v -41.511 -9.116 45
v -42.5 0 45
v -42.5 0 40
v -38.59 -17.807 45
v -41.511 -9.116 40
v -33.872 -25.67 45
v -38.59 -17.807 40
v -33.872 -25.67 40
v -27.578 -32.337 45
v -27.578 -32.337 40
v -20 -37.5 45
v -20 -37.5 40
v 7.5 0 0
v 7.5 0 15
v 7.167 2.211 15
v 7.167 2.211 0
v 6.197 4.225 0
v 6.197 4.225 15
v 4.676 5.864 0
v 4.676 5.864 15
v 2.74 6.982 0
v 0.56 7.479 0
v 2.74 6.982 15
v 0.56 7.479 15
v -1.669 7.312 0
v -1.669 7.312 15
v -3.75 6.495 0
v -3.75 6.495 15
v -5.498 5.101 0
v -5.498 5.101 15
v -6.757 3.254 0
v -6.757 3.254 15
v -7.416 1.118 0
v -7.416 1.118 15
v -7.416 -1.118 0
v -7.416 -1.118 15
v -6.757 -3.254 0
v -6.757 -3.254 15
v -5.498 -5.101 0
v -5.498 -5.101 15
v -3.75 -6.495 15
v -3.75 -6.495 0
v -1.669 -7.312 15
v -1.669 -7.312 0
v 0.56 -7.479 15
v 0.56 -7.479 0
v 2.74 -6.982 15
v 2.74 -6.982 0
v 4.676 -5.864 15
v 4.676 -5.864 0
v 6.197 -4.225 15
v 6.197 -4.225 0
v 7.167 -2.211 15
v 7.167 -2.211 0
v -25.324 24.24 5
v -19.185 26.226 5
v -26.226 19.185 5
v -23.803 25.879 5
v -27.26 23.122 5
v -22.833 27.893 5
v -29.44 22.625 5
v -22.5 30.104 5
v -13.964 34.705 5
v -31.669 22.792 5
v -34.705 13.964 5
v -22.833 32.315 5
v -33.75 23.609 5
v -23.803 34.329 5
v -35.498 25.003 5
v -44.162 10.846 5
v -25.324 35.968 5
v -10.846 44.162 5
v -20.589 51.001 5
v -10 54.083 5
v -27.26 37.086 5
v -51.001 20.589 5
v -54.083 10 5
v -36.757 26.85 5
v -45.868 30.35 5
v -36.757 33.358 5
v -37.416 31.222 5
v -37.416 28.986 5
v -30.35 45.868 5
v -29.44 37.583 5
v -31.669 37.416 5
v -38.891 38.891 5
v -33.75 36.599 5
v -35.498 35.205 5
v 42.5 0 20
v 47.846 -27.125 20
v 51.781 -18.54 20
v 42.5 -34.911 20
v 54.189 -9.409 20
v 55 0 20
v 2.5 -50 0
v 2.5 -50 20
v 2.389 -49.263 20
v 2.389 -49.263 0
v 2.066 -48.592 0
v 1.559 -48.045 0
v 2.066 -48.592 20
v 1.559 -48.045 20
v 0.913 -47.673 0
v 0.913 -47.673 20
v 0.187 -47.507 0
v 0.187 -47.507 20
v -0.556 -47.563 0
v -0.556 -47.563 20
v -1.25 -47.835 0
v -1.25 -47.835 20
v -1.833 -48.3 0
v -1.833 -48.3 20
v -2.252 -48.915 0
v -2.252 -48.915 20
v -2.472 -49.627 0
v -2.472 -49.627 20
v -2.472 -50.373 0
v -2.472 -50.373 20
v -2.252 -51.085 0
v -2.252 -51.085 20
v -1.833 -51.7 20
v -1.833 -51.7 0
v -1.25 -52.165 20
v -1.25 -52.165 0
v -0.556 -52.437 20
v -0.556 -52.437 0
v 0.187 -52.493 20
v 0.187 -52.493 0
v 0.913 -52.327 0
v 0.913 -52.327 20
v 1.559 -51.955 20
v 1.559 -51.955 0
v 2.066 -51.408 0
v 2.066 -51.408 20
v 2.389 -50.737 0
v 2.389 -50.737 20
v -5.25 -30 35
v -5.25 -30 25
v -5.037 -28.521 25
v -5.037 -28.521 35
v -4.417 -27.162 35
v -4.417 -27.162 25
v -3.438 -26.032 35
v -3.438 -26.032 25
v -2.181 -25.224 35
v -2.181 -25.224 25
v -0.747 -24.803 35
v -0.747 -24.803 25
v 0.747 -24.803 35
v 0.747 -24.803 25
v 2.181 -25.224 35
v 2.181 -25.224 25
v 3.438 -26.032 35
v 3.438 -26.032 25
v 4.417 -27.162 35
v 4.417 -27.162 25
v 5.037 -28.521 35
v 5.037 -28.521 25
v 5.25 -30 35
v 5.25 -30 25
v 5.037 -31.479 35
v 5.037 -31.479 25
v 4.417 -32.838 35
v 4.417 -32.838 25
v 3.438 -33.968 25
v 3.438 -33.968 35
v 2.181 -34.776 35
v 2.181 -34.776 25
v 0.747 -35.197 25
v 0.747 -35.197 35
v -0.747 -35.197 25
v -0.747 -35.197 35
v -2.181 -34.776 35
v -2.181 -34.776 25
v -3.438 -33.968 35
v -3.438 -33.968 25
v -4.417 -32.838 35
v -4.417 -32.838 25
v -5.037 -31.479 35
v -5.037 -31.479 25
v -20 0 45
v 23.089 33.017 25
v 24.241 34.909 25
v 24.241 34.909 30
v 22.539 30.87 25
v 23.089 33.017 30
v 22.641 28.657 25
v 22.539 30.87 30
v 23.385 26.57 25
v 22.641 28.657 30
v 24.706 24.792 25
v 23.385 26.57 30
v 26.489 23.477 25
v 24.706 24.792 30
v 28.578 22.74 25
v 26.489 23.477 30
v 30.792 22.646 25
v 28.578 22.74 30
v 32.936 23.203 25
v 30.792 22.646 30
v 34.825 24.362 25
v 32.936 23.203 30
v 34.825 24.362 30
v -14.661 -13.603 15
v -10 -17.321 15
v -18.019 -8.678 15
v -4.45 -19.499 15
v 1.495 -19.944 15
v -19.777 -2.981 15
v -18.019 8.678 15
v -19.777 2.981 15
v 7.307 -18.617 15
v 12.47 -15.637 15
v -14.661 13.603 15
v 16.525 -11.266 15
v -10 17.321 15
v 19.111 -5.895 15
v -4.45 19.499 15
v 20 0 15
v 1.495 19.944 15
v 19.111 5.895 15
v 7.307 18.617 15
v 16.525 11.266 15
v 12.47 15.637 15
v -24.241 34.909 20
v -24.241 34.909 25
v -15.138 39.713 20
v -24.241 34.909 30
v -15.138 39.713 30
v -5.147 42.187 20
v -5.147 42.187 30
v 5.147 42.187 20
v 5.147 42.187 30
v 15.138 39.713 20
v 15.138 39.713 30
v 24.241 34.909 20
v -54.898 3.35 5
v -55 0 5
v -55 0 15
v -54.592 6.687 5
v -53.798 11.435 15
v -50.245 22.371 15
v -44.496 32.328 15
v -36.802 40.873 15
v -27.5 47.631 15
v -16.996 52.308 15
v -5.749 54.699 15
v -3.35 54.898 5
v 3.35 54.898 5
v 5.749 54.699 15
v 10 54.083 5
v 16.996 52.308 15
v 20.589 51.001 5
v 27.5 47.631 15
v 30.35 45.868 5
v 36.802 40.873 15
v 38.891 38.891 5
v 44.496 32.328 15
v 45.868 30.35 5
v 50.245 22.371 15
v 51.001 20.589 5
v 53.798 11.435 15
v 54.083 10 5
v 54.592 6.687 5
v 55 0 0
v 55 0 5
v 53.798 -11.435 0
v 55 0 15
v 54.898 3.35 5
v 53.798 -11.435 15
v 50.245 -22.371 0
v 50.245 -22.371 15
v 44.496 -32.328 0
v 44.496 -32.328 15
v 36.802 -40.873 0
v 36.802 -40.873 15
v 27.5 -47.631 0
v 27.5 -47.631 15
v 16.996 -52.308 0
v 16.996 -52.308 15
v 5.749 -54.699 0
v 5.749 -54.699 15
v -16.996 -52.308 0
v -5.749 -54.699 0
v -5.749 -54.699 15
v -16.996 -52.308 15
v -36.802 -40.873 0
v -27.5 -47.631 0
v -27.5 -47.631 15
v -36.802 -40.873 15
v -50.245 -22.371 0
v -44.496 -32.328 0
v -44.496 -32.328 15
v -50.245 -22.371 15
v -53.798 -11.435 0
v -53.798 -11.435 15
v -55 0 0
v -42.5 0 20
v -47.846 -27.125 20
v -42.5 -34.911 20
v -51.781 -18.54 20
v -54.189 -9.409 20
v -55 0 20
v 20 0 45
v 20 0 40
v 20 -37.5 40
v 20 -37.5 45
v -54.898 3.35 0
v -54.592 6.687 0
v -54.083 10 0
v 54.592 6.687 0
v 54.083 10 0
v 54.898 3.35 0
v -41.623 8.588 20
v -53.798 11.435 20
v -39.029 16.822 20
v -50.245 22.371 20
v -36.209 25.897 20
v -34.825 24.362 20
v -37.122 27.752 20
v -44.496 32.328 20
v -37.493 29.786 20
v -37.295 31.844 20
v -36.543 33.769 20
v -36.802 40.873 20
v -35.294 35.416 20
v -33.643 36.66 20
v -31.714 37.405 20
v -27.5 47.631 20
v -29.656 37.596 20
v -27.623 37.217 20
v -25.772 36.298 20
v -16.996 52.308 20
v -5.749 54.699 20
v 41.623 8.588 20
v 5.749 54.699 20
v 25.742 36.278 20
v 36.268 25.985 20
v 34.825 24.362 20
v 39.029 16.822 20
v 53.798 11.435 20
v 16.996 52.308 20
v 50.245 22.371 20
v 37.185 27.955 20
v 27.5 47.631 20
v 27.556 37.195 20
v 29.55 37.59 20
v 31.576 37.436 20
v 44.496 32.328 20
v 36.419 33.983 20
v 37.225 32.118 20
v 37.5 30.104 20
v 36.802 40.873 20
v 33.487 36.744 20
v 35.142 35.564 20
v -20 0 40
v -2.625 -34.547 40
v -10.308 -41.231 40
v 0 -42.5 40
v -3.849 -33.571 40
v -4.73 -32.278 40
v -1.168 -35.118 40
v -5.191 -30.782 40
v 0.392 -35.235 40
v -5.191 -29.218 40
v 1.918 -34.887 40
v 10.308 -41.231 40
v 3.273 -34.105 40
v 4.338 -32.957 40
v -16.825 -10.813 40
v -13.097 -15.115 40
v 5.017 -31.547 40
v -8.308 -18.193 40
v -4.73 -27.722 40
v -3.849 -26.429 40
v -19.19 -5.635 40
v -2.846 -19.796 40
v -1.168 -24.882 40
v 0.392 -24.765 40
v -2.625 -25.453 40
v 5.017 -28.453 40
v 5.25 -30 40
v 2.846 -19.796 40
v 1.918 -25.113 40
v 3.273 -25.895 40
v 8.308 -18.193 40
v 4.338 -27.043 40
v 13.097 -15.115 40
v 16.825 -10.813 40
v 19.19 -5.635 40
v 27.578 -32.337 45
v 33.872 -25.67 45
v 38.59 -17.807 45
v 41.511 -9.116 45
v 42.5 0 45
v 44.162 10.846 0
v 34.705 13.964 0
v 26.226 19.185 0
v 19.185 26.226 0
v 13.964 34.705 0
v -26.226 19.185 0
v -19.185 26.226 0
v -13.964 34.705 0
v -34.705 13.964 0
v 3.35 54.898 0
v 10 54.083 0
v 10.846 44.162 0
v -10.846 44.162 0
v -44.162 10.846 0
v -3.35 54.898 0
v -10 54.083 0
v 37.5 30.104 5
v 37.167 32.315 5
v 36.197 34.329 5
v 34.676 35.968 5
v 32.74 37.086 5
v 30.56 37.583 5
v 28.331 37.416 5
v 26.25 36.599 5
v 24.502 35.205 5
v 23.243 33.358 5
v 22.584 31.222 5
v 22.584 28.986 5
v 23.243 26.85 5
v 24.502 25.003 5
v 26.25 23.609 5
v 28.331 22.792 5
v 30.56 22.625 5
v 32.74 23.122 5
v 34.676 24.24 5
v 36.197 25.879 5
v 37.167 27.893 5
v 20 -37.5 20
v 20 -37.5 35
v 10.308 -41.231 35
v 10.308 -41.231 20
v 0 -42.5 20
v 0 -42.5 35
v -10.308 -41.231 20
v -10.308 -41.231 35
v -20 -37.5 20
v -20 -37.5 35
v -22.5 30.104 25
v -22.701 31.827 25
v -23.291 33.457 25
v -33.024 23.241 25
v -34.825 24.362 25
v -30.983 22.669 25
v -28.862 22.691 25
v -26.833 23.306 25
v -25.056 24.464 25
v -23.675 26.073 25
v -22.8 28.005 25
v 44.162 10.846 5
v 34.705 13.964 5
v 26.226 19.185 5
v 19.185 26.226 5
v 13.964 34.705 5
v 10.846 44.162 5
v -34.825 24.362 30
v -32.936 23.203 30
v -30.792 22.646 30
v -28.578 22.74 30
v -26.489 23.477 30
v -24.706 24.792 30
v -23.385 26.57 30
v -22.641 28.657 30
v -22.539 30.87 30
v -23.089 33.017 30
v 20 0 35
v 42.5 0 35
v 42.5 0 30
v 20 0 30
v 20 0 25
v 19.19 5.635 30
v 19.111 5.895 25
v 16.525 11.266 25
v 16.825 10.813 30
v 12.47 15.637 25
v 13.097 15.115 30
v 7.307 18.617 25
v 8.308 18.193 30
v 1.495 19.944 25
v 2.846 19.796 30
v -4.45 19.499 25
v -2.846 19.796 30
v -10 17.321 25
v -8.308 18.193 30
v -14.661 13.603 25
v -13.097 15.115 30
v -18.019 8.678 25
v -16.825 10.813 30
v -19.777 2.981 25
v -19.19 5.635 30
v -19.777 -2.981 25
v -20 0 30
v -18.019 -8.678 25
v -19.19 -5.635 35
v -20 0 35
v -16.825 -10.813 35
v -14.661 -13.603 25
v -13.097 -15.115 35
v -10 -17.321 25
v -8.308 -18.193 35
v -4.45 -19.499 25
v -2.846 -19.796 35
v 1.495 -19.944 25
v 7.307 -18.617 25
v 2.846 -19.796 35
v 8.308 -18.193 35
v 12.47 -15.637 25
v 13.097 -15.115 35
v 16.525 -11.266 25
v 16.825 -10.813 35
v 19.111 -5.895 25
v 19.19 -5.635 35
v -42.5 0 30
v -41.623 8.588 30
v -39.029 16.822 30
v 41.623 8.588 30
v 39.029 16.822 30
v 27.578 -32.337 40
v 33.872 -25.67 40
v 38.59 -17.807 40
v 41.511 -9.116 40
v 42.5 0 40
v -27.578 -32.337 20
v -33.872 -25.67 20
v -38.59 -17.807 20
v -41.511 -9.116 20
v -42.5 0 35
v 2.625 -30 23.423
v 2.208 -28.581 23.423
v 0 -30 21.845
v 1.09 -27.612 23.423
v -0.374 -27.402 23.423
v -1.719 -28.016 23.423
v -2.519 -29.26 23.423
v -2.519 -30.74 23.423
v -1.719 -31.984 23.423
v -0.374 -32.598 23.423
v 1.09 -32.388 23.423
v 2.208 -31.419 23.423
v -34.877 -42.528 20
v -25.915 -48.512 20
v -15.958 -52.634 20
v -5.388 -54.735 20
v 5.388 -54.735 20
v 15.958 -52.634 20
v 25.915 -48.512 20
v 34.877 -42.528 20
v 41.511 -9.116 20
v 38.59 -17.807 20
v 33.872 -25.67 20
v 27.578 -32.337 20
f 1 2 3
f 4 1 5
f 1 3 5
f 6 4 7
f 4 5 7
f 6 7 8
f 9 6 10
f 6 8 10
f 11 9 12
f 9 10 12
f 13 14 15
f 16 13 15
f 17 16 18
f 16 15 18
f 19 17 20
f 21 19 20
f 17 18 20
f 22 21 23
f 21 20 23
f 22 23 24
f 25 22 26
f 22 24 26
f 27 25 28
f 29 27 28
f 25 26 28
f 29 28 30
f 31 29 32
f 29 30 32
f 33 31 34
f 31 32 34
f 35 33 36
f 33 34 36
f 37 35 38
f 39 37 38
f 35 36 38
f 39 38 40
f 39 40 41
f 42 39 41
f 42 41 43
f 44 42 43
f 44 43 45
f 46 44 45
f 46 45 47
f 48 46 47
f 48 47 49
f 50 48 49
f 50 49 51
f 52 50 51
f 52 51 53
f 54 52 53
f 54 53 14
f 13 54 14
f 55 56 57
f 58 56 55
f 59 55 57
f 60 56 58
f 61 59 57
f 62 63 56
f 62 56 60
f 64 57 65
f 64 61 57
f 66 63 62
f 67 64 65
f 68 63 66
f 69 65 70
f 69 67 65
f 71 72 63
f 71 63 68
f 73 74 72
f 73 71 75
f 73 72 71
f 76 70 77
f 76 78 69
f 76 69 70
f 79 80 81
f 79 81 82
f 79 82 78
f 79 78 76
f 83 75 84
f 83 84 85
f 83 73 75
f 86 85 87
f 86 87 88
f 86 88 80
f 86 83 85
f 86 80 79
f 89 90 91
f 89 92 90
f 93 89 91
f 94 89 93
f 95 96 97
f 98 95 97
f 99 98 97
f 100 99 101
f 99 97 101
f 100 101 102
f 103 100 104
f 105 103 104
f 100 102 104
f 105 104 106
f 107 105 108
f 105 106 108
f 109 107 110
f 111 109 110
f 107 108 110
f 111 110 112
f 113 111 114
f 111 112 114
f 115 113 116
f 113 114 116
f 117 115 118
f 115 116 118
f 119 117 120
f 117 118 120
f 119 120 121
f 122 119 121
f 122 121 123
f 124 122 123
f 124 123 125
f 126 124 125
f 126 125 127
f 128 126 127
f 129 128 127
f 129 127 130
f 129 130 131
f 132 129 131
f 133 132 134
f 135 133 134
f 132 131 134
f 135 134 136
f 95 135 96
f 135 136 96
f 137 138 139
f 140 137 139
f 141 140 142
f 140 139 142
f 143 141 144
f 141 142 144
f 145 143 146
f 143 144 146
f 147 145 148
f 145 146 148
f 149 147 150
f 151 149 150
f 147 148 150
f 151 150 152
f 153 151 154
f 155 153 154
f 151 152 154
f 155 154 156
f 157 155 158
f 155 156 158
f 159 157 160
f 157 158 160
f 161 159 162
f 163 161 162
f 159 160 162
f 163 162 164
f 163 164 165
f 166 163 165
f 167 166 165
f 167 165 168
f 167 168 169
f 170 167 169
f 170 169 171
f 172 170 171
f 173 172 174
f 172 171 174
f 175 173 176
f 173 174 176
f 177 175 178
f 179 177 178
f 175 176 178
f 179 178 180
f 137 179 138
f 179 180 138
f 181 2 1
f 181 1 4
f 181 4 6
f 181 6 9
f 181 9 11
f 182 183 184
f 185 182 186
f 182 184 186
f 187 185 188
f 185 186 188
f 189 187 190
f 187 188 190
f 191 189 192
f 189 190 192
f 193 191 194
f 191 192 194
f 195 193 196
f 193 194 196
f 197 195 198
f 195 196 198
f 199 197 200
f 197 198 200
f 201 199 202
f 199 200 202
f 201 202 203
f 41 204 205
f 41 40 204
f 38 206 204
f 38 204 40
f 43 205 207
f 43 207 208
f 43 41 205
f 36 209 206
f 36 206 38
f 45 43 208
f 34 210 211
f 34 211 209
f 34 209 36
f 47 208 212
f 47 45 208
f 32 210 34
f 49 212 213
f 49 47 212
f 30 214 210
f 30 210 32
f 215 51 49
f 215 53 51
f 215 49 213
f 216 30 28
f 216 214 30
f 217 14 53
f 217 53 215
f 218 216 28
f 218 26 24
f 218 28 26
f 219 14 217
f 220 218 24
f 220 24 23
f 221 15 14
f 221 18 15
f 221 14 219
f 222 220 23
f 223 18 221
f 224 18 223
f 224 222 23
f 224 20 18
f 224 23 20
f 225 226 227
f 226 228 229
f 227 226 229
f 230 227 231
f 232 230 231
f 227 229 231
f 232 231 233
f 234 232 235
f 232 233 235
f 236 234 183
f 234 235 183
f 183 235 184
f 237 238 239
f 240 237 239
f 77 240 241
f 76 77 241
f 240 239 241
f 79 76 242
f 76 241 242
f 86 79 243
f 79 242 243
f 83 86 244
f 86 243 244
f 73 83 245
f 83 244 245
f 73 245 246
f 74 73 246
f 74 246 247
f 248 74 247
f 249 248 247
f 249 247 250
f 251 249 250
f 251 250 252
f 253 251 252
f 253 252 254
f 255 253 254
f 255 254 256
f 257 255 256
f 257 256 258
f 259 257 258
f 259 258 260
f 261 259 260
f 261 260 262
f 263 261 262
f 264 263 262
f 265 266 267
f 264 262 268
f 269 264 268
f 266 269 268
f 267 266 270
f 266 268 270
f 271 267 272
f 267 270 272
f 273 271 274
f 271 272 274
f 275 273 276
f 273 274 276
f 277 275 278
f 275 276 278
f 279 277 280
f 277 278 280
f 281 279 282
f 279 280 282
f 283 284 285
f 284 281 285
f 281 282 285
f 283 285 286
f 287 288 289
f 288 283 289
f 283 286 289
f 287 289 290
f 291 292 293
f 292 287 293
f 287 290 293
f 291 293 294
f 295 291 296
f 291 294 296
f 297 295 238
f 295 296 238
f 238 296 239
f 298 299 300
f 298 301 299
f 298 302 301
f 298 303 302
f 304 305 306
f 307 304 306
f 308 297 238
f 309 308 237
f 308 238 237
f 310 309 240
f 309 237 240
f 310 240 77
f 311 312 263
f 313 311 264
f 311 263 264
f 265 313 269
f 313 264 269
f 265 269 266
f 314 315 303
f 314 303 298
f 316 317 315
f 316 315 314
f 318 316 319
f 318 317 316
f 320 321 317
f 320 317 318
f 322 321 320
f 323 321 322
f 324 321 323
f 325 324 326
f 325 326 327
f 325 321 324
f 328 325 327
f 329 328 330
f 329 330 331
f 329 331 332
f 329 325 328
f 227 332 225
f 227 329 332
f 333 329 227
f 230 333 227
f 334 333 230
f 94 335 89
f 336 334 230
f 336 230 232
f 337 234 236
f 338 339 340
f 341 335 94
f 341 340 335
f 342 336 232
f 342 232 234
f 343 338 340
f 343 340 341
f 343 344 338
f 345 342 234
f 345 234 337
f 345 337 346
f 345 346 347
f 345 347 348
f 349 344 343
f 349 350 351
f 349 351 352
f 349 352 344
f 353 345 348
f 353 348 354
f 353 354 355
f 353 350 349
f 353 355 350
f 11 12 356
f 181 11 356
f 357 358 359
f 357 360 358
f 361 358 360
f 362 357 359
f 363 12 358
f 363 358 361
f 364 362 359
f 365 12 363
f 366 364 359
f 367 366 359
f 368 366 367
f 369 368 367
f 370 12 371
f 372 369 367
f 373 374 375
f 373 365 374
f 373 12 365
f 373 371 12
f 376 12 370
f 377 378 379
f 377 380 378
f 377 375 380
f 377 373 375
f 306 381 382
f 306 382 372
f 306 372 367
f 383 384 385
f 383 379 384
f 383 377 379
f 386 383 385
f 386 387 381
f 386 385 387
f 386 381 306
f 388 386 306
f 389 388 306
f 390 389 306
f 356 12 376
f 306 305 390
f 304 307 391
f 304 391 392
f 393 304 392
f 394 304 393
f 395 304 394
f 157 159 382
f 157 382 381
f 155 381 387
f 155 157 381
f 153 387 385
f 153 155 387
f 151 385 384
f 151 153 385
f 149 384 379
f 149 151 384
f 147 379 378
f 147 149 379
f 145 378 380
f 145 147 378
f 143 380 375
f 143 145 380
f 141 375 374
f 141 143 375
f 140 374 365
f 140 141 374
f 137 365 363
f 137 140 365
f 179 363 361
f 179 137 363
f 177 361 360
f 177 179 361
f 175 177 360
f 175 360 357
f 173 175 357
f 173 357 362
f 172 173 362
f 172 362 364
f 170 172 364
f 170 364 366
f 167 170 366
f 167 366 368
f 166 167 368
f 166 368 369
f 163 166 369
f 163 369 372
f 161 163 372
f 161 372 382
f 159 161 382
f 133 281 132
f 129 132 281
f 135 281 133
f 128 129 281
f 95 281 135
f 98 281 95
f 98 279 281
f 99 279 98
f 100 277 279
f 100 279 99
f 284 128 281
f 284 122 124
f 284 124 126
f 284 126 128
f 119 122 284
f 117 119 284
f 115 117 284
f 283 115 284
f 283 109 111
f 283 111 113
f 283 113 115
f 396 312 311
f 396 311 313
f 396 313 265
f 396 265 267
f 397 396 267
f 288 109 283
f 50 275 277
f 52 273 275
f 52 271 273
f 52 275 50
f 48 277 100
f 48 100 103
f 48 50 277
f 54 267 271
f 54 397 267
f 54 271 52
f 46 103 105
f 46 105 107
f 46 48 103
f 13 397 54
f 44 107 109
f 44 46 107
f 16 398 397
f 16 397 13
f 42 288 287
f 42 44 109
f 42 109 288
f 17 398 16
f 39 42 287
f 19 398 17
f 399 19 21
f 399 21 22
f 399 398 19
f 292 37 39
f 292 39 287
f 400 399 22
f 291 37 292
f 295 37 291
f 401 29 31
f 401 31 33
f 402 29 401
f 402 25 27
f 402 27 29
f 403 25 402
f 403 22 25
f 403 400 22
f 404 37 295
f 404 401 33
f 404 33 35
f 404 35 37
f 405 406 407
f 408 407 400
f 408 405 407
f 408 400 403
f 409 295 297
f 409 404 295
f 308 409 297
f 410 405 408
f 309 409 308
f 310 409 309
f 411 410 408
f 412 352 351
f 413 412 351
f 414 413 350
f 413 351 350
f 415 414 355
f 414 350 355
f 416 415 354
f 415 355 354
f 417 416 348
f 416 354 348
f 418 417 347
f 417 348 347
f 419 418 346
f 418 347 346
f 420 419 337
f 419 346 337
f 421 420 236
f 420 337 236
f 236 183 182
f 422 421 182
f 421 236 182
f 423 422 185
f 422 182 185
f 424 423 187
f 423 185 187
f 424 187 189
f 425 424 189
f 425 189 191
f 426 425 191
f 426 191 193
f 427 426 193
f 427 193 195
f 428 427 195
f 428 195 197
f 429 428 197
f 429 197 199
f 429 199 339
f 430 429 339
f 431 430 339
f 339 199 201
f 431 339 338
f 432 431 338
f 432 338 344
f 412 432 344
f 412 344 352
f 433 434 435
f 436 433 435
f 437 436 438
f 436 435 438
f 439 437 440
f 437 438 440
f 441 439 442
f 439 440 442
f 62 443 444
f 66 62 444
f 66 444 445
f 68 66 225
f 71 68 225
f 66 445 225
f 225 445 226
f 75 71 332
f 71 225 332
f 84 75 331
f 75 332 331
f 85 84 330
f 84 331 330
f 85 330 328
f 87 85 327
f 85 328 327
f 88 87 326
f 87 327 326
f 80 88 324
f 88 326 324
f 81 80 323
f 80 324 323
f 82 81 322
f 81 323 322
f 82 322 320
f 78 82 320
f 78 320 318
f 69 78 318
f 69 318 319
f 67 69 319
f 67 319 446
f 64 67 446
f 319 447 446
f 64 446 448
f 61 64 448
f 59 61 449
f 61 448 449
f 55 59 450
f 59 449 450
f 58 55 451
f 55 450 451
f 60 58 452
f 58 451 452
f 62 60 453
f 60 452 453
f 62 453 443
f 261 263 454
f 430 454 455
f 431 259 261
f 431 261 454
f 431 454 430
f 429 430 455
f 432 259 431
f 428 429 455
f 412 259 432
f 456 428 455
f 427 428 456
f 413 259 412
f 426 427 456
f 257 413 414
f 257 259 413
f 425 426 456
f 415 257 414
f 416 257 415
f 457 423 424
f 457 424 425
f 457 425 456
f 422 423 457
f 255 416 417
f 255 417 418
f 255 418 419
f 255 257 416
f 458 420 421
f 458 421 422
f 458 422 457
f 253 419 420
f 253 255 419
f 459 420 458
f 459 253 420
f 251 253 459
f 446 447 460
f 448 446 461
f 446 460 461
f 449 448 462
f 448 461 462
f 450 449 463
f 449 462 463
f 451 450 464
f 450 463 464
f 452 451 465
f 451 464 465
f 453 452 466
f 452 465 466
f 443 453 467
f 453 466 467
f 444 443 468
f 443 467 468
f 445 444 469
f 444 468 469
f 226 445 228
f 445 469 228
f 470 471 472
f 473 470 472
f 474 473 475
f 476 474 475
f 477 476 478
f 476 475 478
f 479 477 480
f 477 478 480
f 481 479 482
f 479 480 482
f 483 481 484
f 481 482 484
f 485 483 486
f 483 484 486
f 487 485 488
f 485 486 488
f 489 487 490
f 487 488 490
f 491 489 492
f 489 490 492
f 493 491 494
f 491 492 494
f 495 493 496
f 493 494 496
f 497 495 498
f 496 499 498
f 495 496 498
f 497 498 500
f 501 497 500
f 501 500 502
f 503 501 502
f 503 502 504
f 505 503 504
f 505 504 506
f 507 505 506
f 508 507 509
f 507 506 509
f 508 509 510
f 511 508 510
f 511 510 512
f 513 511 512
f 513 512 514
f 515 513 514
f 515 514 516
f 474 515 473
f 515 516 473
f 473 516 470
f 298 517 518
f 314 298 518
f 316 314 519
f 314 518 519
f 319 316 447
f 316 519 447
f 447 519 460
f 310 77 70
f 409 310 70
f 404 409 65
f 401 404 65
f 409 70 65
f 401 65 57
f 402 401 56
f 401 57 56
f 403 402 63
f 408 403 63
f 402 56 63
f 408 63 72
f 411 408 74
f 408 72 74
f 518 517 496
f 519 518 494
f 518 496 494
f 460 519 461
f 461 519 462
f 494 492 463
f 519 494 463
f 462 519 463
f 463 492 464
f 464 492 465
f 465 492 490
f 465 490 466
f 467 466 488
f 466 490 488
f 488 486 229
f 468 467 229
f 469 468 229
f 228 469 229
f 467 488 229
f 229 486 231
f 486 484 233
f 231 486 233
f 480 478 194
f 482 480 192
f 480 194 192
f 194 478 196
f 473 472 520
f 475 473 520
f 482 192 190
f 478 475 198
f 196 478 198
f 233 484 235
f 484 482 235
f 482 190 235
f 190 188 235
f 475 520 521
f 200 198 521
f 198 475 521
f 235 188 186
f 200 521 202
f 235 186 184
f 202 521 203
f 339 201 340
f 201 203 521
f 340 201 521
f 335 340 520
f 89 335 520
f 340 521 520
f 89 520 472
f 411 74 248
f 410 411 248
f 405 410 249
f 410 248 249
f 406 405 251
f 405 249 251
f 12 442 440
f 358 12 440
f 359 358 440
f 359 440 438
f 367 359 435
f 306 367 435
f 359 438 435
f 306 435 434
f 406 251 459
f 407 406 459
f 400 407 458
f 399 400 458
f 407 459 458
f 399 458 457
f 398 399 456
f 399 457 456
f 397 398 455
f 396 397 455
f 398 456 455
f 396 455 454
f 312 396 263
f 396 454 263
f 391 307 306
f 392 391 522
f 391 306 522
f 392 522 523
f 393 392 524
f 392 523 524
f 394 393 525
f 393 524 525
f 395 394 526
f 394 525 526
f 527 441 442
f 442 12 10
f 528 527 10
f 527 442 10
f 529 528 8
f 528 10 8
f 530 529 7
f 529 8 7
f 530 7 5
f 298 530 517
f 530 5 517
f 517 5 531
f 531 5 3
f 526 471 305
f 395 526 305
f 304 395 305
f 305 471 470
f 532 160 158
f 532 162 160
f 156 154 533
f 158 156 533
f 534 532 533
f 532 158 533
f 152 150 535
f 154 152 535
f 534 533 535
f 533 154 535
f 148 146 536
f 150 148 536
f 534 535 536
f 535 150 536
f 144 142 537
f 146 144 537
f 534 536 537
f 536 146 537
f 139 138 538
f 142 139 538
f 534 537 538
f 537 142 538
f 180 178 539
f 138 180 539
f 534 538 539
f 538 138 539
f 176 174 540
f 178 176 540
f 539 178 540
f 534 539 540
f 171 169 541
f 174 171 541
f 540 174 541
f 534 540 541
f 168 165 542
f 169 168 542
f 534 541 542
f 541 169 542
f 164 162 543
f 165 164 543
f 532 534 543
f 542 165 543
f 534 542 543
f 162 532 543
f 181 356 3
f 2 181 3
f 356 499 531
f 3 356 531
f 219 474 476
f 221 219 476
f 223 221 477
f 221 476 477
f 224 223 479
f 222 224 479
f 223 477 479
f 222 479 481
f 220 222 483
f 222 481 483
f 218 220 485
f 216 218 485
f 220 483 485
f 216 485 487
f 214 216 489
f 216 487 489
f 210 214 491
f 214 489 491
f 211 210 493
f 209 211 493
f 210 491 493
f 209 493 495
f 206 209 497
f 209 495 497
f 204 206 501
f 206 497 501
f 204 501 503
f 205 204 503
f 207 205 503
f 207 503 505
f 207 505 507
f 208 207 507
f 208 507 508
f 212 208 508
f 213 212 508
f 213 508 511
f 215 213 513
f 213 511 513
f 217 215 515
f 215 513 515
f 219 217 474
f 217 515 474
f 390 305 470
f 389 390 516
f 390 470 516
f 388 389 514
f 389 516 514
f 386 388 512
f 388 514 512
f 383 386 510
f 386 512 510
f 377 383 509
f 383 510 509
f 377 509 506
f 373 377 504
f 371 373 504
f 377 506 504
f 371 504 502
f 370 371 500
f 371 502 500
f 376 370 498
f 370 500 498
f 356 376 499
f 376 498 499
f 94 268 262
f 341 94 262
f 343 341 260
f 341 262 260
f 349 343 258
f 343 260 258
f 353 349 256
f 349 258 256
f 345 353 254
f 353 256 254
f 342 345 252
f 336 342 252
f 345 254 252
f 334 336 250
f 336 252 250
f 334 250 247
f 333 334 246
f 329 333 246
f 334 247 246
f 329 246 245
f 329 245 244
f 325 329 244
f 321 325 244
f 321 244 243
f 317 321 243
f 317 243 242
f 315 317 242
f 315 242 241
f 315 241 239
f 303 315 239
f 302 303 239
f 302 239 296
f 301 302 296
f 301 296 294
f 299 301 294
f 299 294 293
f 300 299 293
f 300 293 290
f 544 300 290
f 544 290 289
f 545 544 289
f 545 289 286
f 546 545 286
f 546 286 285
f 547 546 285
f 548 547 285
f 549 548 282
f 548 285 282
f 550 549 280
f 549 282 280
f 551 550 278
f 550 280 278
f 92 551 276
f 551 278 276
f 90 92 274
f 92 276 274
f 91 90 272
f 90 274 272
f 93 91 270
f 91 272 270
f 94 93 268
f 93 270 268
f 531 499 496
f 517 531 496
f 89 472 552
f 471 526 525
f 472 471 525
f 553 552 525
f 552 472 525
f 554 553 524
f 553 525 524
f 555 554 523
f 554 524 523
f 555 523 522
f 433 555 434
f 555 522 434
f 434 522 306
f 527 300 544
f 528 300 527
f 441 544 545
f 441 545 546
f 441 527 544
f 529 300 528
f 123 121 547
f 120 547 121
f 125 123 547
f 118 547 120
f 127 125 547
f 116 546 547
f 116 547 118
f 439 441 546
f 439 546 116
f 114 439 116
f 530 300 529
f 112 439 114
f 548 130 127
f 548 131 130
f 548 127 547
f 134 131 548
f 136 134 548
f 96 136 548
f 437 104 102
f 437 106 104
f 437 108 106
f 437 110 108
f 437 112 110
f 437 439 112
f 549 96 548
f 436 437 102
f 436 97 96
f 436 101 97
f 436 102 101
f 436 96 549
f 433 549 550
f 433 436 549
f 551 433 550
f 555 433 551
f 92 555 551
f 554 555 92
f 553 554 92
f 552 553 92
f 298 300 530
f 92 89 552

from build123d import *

# Parameters (mm, degrees)
BOSS_EXTRUDE1_DEPTH        = 15
SKETCH2_R                  = 42.5
BOSS_EXTRUDE2_DEPTH        = 10
CUT_EXTRUDE1_DEPTH         = 10
SKETCH4_R                  = 55
BOSS_EXTRUDE3_DEPTH        = 15
SKETCH5_R                  = 42.5
CUT_EXTRUDE16_DEPTH        = 5
BOSS_EXTRUDE4_DEPTH        = 10
SKETCH11_R                 = 20
SKETCH11_R_2               = 7.5
CUT_EXTRUDE18_DEPTH        = 20
SKETCH13_R                 = 2.5
CUT_EXTRUDE19_DEPTH        = 15
SKETCH14_R                 = 7.5
CUT_EXTRUDE20_DEPTH        = 20
CUT_EXTRUDE21_DEPTH        = 20
SKETCH23_R                 = 55
BOSS_EXTRUDE5_DEPTH        = 10
SKETCH24_R                 = 55
BOSS_EXTRUDE6_DEPTH        = 10
SKETCH25_W                 = 15
SKETCH25_H                 = 55
CUT_EXTRUDE22_DEPTH        = 70
SKETCH26_R                 = 7.5
CUT_EXTRUDE23_DEPTH        = 140
CUT_EXTRUDE24_DEPTH        = 140
SKETCH29_R                 = 20
CUT_EXTRUDE25_DEPTH        = 10
CUT_EXTRUDE28_DEPTH        = 10
BOSS_EXTRUDE8_DEPTH        = 5
M12X1_5_TAPPED_HOLE1_D     = 10.5
M12X1_5_TAPPED_HOLE1_DEPTH = 10
M12X1_5_TAPPED_HOLE1_TIP   = 3.15451825
SKETCH37_W                 = 12.5
SKETCH37_H                 = 25
CUT_EXTRUDE29_DEPTH        = 75
CUT_EXTRUDE30_DEPTH        = 20
SKETCH39_R                 = 2.5
CUT_EXTRUDE31_DEPTH        = 20
SKETCH41_R                 = 5.25
BOSS_EXTRUDE17_DEPTH       = 5


with BuildPart() as part:
    # Sketch1 → Boss-Extrude1 (new body)
    with BuildSketch(Plane.XY):
        with BuildLine():
            ThreePointArc((-55, 0), (0, -55), (55, 0))
            ThreePointArc((55, 0), (23.180194847, 13.180194847), (10, 45))
            ThreePointArc((10, 45), (0, 45.916730868), (-10, 45))
            ThreePointArc((-10, 45), (-23.180194847, 13.180194847), (-55, 0))
        make_face()
    extrude(amount=BOSS_EXTRUDE1_DEPTH)

    # Sketch2 → Boss-Extrude2 (add)
    with BuildSketch(Plane.XY.offset(15)):
        Circle(SKETCH2_R)
    extrude(amount=BOSS_EXTRUDE2_DEPTH)

    # Sketch3 → Cut-Extrude1 (cut)
    with BuildSketch(Plane.XY.offset(25)):
        with BuildLine():
            ThreePointArc((-36.280461431, 22.13544936), (-23.020695518, 22.941176471), (-22.260854774, 36.203650986))
            ThreePointArc((-22.260854774, 36.203650986), (-30.103986447, 30), (-36.280461431, 22.13544936))
        make_face()
        with BuildLine():
            ThreePointArc((22.260854774, 36.203650986), (23.020695518, 22.941176471), (36.280461431, 22.13544936))
            ThreePointArc((36.280461431, 22.13544936), (30.103986447, 30), (22.260854774, 36.203650986))
        make_face()
    extrude(amount=-CUT_EXTRUDE1_DEPTH, mode=Mode.SUBTRACT)

    # Sketch4 → Boss-Extrude3 (add)
    with BuildSketch(Plane.XY.offset(25)):
        Circle(SKETCH4_R)
    extrude(amount=BOSS_EXTRUDE3_DEPTH)

    # Sketch5 → Cut-Extrude16 (cut)
    with BuildSketch(Plane.XY.offset(40)):
        Circle(SKETCH5_R)
    extrude(amount=-CUT_EXTRUDE16_DEPTH, mode=Mode.SUBTRACT)

    # Sketch10 → Boss-Extrude4 (add)
    with BuildSketch(Plane.XY.offset(35)):
        with BuildLine():
            Line((-20, -37.5), (-20, 0))
            Line((-20, 0), (-42.5, 0))
            ThreePointArc((-42.5, 0), (-36.443449343, -21.866069606), (-20, -37.5))
        make_face()
        with BuildLine():
            Line((42.5, 0), (20, 0))
            Line((20, 0), (20, -37.5))
            ThreePointArc((20, -37.5), (36.443449343, -21.866069606), (42.5, 0))
        make_face()
    extrude(amount=BOSS_EXTRUDE4_DEPTH)

    # Sketch11 → Cut-Extrude18 (cut)
    with BuildSketch(Plane.XY.offset(35)):
        Circle(SKETCH11_R)
        Circle(SKETCH11_R_2, mode=Mode.SUBTRACT)
    extrude(amount=-CUT_EXTRUDE18_DEPTH, mode=Mode.SUBTRACT)

    # Sketch13 → Cut-Extrude19 (cut)
    with BuildSketch(Plane.XY.offset(40)):
        with Locations((0, -50)):
            Circle(SKETCH13_R)
    extrude(amount=-CUT_EXTRUDE19_DEPTH, mode=Mode.SUBTRACT)

    # Sketch14 → Cut-Extrude20 (cut)
    with BuildSketch(Plane.XY.offset(35)):
        with Locations((-30, 30.103986447)):
            Circle(SKETCH14_R)
        with Locations((30, 30.103986447)):
            Circle(SKETCH14_R)
    extrude(amount=-CUT_EXTRUDE20_DEPTH, mode=Mode.SUBTRACT)

    # Sketch16 → Cut-Extrude21 (cut)
    with BuildSketch(Plane.XY.offset(40)):
        with BuildLine():
            ThreePointArc((-34.824619737, 24.361770464), (-26.832560027, 23.305654003), (-22.5, 30.103986447))
            ThreePointArc((-22.5, 30.103986447), (-22.948703366, 32.659219465), (-24.241124207, 34.908708042))
            ThreePointArc((-24.241124207, 34.908708042), (-30, 30.103986447), (-34.824619737, 24.361770464))
        make_face()
        with BuildLine():
            ThreePointArc((-34.824619737, 24.361770464), (-30, 30.103986447), (-24.241124207, 34.908708042))
            ThreePointArc((-24.241124207, 34.908708042), (-35.294117647, 35.416454644), (-34.824619737, 24.361770464))
        make_face()
        with BuildLine():
            ThreePointArc((37.5, 30.103986447), (32.555233018, 37.155283081), (24.241124207, 34.908708042))
            ThreePointArc((24.241124207, 34.908708042), (30, 30.103986447), (34.824619737, 24.361770464))
            ThreePointArc((34.824619737, 24.361770464), (36.798332444, 26.936546474), (37.5, 30.103986447))
        make_face()
        with BuildLine():
            ThreePointArc((34.824619737, 24.361770464), (30, 30.103986447), (24.241124207, 34.908708042))
            ThreePointArc((24.241124207, 34.908708042), (24.705882353, 24.79151825), (34.824619737, 24.361770464))
        make_face()
    extrude(amount=-CUT_EXTRUDE21_DEPTH, mode=Mode.SUBTRACT)

    # Sketch23 → Boss-Extrude5 (add)
    with BuildSketch(Plane(origin=(0, 0, 15), x_dir=(-1, 0, 0), z_dir=(0, 0, -1))):
        Circle(SKETCH23_R)
    extrude(amount=BOSS_EXTRUDE5_DEPTH)

    # Sketch24 → Boss-Extrude6 (add)
    with BuildSketch(Plane.XY.offset(15)):
        Circle(SKETCH24_R)
    extrude(amount=BOSS_EXTRUDE6_DEPTH)

    # Sketch25 → Cut-Extrude22 (cut, symmetric)
    with BuildSketch(Plane(origin=(0, 0, 0), x_dir=(0, 0, -1), z_dir=(1, 0, 0))):
        with Locations((-37.5, 27.5)):
            Rectangle(SKETCH25_W, SKETCH25_H)
    extrude(amount=CUT_EXTRUDE22_DEPTH, both=True, mode=Mode.SUBTRACT)

    # Sketch26 → Cut-Extrude23 (cut)
    with BuildSketch(Plane.XY.offset(25)):
        with Locations((30, 30.103986447)):
            Circle(SKETCH26_R)
        with Locations((-30, 30.103986447)):
            Circle(SKETCH26_R)
    extrude(amount=-CUT_EXTRUDE23_DEPTH, mode=Mode.SUBTRACT)

    # Sketch27 → Cut-Extrude24 (cut)
    with BuildSketch(Plane.XY.offset(35)):
        with BuildLine():
            ThreePointArc((-7.5, 0), (0, -7.5), (7.5, 0))
            Line((7.5, 0), (-7.5, 0))
        make_face()
        with BuildLine():
            ThreePointArc((7.5, 0), (0, 7.5), (-7.5, 0))
            Line((-7.5, 0), (7.5, 0))
        make_face()
    extrude(amount=-CUT_EXTRUDE24_DEPTH, mode=Mode.SUBTRACT)

    # Sketch29 → Cut-Extrude25 (cut)
    with BuildSketch(Plane.XY.offset(25)):
        Circle(SKETCH29_R)
    extrude(amount=-CUT_EXTRUDE25_DEPTH, mode=Mode.SUBTRACT)

    # Sketch33 → Cut-Extrude28 (cut)
    with BuildSketch(Plane.XY.offset(30)):
        with BuildLine():
            ThreePointArc((55, 0), (0, 55), (-55, 0))
            Line((-55, 0), (-42.5, 0))
            ThreePointArc((-42.5, 0), (-40.535764078, 12.771132706), (-34.824619737, 24.361770464))
            ThreePointArc((-34.824619737, 24.361770464), (-35.294117647, 35.416454644), (-24.241124207, 34.908708042))
            ThreePointArc((-24.241124207, 34.908708042), (0, 42.5), (24.241124207, 34.908708042))
            ThreePointArc((24.241124207, 34.908708042), (32.555233018, 37.155283081), (37.5, 30.103986447))
            ThreePointArc((37.5, 30.103986447), (36.798332444, 26.936546474), (34.824619737, 24.361770464))
            ThreePointArc((34.824619737, 24.361770464), (40.535764078, 12.771132706), (42.5, 0))
            Line((42.5, 0), (55, 0))
        make_face()
    extrude(amount=-CUT_EXTRUDE28_DEPTH, mode=Mode.SUBTRACT)

    # Sketch34 → Boss-Extrude8 (add)
    with BuildSketch(Plane(origin=(0, 0, 5), x_dir=(-1, 0, 0), z_dir=(0, 0, -1))):
        with BuildLine():
            ThreePointArc((-10, 54.083269132), (-22.5, 22.5), (-54.083269132, 10))
            ThreePointArc((-54.083269132, 10), (-54.770337785, 5.02096593), (-55, 0))
            ThreePointArc((-55, 0), (-23.180194847, 13.180194847), (-10, 45))
            ThreePointArc((-10, 45), (0, 45.916730868), (10, 45))
            ThreePointArc((10, 45), (23.180194847, 13.180194847), (55, 0))
            ThreePointArc((55, 0), (54.770337785, 5.02096593), (54.083269132, 10))
            ThreePointArc((54.083269132, 10), (22.5, 22.5), (10, 54.083269132))
            ThreePointArc((10, 54.083269132), (0, 55), (-10, 54.083269132))
        make_face()
    extrude(amount=BOSS_EXTRUDE8_DEPTH)

    # M12x1.5 Tapped Hole1
    with Locations(Plane(origin=(0, -30, 35), x_dir=(1, 0, 0), z_dir=(0, 0, 1))):
        with Locations((0, 0)):
            Hole(M12X1_5_TAPPED_HOLE1_D / 2, depth=M12X1_5_TAPPED_HOLE1_DEPTH)
            with Locations((0, 0, -(M12X1_5_TAPPED_HOLE1_DEPTH + M12X1_5_TAPPED_HOLE1_TIP / 2))):  # 118° drill point
                Cone(0, M12X1_5_TAPPED_HOLE1_D / 2, M12X1_5_TAPPED_HOLE1_TIP, mode=Mode.SUBTRACT)

    # Sketch37 → Cut-Extrude29 (cut)
    with BuildSketch(Plane(origin=(0, 0, 0), x_dir=(1, 0, 0), z_dir=(0, 1, 0))):
        with Locations((-48.75, -32.5)):
            Rectangle(SKETCH37_W, SKETCH37_H)
        with Locations((48.75, -32.5)):
            Rectangle(SKETCH37_W, SKETCH37_H)
    extrude(amount=-CUT_EXTRUDE29_DEPTH, mode=Mode.SUBTRACT)

    # Sketch38 → Cut-Extrude30 (cut)
    with BuildSketch(Plane.XY.offset(40)):
        with BuildLine():
            Line((-42.5, 0), (-42.5, -34.910600109))
            ThreePointArc((-42.5, -34.910600109), (0, -55), (42.5, -34.910600109))
            Line((42.5, -34.910600109), (42.5, 0))
            ThreePointArc((42.5, 0), (36.443449343, -21.866069606), (20, -37.5))
            ThreePointArc((20, -37.5), (0, -42.5), (-20, -37.5))
            ThreePointArc((-20, -37.5), (-36.443449343, -21.866069606), (-42.5, 0))
        make_face()
    extrude(amount=-CUT_EXTRUDE30_DEPTH, mode=Mode.SUBTRACT)

    # Sketch39 → Cut-Extrude31 (cut)
    with BuildSketch(Plane.XY.offset(20)):
        with Locations((0, -50)):
            Circle(SKETCH39_R)
    extrude(amount=-CUT_EXTRUDE31_DEPTH, mode=Mode.SUBTRACT)

    # Sketch41 → Boss-Extrude17 (add)
    with BuildSketch(Plane.XY.offset(35)):
        with BuildLine():
            Line((-20, 0), (-20, -37.5))
            ThreePointArc((-20, -37.5), (0, -42.5), (20, -37.5))
            Line((20, -37.5), (20, 0))
            ThreePointArc((20, 0), (0, -20), (-20, 0))
        make_face()
        with Locations((0, -30)):
            Circle(SKETCH41_R, mode=Mode.SUBTRACT)
    extrude(amount=BOSS_EXTRUDE17_DEPTH)


solid = part.part
